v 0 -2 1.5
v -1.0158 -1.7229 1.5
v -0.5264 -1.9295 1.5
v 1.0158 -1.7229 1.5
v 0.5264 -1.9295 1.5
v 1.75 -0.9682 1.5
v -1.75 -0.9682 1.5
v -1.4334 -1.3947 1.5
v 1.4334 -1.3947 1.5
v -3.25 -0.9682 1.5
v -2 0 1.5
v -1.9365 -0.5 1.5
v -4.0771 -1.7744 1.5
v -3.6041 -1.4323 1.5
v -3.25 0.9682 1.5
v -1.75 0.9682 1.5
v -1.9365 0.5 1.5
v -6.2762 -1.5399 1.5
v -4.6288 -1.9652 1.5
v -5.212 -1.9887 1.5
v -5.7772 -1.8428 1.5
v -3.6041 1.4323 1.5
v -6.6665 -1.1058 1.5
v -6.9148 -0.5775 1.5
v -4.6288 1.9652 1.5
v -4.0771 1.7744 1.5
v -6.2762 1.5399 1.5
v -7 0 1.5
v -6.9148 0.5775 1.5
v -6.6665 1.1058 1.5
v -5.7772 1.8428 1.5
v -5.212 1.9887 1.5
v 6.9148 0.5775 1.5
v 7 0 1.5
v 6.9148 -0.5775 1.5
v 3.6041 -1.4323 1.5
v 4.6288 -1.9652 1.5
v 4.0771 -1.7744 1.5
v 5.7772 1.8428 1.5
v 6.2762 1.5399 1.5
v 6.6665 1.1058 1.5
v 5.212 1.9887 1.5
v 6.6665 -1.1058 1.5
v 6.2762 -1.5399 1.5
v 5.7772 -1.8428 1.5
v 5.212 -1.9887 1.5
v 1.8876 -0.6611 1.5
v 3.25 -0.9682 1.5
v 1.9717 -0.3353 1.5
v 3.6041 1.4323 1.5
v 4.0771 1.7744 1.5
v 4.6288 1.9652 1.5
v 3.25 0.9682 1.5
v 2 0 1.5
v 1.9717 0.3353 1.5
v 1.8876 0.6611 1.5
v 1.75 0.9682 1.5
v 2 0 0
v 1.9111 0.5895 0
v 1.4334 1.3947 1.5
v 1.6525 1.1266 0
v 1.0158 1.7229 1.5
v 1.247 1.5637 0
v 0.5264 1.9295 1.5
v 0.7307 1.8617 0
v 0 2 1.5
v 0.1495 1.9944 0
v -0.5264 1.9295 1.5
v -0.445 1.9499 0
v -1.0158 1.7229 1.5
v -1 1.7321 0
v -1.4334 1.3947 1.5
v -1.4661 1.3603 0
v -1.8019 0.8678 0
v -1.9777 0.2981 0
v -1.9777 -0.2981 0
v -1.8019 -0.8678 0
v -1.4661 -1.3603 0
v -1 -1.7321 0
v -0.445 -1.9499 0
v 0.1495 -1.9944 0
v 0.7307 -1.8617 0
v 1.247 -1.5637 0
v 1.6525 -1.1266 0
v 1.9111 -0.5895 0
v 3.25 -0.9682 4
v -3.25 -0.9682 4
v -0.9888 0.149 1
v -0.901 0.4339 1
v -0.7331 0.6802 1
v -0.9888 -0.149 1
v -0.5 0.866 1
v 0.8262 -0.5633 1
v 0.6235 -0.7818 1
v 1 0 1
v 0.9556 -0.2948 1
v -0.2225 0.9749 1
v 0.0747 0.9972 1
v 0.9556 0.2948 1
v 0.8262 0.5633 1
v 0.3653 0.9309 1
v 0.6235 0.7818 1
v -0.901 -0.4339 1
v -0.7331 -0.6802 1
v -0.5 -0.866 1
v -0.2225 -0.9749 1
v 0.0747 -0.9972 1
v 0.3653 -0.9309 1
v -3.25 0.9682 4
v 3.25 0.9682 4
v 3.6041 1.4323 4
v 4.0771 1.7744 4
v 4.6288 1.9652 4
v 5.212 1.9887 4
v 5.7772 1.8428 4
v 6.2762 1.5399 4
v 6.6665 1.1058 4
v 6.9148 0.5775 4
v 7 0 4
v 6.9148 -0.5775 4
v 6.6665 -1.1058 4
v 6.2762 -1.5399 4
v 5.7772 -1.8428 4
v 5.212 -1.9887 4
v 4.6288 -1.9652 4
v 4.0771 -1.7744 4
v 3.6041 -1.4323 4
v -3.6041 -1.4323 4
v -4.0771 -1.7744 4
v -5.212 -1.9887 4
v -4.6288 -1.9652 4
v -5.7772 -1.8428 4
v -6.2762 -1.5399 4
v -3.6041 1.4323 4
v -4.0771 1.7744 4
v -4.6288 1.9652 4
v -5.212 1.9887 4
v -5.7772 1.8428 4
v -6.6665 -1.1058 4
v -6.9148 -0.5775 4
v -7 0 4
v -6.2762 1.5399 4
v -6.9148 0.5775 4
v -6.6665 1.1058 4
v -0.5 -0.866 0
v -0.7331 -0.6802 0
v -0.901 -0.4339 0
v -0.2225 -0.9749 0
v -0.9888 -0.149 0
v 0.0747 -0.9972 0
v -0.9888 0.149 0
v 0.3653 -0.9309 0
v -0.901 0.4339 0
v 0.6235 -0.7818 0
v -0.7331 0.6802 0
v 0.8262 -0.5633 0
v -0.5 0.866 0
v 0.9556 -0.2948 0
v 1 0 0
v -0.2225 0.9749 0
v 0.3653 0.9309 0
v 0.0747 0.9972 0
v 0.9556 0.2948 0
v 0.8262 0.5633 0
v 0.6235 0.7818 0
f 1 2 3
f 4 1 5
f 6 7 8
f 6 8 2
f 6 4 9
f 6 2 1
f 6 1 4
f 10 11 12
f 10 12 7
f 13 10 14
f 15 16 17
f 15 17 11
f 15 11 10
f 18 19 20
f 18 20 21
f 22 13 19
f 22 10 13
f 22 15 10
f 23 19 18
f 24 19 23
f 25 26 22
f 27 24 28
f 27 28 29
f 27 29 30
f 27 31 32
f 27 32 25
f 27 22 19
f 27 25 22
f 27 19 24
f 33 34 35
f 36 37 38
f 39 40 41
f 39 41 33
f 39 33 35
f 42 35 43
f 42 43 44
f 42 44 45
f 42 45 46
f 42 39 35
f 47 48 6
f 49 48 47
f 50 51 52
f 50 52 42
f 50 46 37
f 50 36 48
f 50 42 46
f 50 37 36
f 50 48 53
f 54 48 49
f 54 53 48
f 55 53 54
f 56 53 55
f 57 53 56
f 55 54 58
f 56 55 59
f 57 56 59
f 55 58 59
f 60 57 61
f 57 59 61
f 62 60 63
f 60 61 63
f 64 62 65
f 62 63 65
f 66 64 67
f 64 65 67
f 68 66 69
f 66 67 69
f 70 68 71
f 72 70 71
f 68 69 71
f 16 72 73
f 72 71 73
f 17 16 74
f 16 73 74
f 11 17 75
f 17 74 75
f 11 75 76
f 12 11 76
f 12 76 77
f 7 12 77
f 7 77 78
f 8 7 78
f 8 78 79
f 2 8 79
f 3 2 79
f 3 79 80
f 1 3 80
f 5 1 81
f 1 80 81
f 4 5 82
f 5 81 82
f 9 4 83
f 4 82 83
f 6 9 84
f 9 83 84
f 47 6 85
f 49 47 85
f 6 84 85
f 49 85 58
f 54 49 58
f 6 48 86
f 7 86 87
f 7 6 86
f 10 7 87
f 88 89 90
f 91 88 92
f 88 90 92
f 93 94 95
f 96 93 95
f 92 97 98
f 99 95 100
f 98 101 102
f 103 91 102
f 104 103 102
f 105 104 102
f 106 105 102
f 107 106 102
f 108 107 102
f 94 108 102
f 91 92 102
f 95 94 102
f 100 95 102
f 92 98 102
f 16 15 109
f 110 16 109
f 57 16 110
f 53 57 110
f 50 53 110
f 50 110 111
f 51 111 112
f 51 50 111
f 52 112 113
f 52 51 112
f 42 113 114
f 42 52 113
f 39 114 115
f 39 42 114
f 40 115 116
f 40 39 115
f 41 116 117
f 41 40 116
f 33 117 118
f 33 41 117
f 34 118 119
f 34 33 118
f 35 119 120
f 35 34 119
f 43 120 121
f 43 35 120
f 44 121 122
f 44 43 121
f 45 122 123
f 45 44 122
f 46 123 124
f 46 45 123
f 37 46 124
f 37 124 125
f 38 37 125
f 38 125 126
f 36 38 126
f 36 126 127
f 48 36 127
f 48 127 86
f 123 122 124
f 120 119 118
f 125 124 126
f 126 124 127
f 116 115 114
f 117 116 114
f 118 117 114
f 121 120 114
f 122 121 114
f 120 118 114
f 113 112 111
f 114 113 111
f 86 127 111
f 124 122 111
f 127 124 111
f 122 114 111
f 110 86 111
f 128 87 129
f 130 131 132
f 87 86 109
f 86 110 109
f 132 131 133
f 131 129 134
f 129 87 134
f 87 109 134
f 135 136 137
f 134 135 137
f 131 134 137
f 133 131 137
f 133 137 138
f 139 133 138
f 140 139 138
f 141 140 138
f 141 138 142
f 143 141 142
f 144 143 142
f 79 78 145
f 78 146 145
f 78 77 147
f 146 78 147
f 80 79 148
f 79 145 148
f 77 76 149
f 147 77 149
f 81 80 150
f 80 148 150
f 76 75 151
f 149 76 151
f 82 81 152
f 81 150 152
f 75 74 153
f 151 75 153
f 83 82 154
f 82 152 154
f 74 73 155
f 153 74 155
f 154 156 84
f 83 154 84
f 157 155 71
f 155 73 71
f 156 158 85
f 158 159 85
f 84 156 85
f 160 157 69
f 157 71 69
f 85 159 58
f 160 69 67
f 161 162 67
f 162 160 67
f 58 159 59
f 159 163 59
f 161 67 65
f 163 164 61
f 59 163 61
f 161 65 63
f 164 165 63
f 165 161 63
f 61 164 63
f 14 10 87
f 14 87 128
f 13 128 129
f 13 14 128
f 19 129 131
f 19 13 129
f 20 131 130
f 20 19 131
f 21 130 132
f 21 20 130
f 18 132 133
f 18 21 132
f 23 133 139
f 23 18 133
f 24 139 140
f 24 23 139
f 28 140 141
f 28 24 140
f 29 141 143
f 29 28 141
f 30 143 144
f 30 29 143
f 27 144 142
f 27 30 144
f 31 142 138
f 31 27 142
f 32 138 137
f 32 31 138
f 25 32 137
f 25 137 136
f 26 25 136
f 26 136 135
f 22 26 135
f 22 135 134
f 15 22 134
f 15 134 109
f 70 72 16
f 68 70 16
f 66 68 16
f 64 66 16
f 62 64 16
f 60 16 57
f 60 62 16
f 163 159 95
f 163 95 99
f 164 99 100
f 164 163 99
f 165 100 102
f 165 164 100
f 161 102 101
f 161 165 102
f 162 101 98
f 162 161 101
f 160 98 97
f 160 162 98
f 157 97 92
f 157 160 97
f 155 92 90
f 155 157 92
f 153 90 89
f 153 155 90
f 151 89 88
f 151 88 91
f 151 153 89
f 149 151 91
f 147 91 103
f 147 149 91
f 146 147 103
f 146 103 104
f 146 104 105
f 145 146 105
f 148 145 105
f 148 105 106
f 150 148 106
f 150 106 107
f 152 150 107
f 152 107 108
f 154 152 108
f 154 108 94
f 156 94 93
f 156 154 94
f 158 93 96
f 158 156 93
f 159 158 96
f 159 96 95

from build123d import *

# Parameters (mm, degrees)
SKETCH1_R           = 2
SKETCH1_R_2         = 1
BOSS_EXTRUDE1_DEPTH = 1
SKETCH2_R           = 2
BOSS_EXTRUDE2_DEPTH = 0.5
BOSS_EXTRUDE3_DEPTH = 2.5


with BuildPart() as part:
    # Sketch1 → Boss-Extrude1 (new body)
    with BuildSketch(Plane.XY):
        Circle(SKETCH1_R)
        Circle(SKETCH1_R_2, mode=Mode.SUBTRACT)
    extrude(amount=BOSS_EXTRUDE1_DEPTH)

    # Sketch2 → Boss-Extrude2 (add)
    with BuildSketch(Plane.XY.offset(1)):
        Circle(SKETCH2_R)
    extrude(amount=BOSS_EXTRUDE2_DEPTH)

    # Sketch3 → Boss-Extrude3 (add)
    with BuildSketch(Plane.XY.offset(1.5)):
        with BuildLine():
            Line((3.25, -0.968245837), (-3.25, -0.968245837))
            ThreePointArc((-3.25, -0.968245837), (-7, 0), (-3.25, 0.968245837))
            Line((-3.25, 0.968245837), (3.25, 0.968245837))
            ThreePointArc((3.25, 0.968245837), (7, 0), (3.25, -0.968245837))
        make_face()
    extrude(amount=BOSS_EXTRUDE3_DEPTH)


solid = part.part
